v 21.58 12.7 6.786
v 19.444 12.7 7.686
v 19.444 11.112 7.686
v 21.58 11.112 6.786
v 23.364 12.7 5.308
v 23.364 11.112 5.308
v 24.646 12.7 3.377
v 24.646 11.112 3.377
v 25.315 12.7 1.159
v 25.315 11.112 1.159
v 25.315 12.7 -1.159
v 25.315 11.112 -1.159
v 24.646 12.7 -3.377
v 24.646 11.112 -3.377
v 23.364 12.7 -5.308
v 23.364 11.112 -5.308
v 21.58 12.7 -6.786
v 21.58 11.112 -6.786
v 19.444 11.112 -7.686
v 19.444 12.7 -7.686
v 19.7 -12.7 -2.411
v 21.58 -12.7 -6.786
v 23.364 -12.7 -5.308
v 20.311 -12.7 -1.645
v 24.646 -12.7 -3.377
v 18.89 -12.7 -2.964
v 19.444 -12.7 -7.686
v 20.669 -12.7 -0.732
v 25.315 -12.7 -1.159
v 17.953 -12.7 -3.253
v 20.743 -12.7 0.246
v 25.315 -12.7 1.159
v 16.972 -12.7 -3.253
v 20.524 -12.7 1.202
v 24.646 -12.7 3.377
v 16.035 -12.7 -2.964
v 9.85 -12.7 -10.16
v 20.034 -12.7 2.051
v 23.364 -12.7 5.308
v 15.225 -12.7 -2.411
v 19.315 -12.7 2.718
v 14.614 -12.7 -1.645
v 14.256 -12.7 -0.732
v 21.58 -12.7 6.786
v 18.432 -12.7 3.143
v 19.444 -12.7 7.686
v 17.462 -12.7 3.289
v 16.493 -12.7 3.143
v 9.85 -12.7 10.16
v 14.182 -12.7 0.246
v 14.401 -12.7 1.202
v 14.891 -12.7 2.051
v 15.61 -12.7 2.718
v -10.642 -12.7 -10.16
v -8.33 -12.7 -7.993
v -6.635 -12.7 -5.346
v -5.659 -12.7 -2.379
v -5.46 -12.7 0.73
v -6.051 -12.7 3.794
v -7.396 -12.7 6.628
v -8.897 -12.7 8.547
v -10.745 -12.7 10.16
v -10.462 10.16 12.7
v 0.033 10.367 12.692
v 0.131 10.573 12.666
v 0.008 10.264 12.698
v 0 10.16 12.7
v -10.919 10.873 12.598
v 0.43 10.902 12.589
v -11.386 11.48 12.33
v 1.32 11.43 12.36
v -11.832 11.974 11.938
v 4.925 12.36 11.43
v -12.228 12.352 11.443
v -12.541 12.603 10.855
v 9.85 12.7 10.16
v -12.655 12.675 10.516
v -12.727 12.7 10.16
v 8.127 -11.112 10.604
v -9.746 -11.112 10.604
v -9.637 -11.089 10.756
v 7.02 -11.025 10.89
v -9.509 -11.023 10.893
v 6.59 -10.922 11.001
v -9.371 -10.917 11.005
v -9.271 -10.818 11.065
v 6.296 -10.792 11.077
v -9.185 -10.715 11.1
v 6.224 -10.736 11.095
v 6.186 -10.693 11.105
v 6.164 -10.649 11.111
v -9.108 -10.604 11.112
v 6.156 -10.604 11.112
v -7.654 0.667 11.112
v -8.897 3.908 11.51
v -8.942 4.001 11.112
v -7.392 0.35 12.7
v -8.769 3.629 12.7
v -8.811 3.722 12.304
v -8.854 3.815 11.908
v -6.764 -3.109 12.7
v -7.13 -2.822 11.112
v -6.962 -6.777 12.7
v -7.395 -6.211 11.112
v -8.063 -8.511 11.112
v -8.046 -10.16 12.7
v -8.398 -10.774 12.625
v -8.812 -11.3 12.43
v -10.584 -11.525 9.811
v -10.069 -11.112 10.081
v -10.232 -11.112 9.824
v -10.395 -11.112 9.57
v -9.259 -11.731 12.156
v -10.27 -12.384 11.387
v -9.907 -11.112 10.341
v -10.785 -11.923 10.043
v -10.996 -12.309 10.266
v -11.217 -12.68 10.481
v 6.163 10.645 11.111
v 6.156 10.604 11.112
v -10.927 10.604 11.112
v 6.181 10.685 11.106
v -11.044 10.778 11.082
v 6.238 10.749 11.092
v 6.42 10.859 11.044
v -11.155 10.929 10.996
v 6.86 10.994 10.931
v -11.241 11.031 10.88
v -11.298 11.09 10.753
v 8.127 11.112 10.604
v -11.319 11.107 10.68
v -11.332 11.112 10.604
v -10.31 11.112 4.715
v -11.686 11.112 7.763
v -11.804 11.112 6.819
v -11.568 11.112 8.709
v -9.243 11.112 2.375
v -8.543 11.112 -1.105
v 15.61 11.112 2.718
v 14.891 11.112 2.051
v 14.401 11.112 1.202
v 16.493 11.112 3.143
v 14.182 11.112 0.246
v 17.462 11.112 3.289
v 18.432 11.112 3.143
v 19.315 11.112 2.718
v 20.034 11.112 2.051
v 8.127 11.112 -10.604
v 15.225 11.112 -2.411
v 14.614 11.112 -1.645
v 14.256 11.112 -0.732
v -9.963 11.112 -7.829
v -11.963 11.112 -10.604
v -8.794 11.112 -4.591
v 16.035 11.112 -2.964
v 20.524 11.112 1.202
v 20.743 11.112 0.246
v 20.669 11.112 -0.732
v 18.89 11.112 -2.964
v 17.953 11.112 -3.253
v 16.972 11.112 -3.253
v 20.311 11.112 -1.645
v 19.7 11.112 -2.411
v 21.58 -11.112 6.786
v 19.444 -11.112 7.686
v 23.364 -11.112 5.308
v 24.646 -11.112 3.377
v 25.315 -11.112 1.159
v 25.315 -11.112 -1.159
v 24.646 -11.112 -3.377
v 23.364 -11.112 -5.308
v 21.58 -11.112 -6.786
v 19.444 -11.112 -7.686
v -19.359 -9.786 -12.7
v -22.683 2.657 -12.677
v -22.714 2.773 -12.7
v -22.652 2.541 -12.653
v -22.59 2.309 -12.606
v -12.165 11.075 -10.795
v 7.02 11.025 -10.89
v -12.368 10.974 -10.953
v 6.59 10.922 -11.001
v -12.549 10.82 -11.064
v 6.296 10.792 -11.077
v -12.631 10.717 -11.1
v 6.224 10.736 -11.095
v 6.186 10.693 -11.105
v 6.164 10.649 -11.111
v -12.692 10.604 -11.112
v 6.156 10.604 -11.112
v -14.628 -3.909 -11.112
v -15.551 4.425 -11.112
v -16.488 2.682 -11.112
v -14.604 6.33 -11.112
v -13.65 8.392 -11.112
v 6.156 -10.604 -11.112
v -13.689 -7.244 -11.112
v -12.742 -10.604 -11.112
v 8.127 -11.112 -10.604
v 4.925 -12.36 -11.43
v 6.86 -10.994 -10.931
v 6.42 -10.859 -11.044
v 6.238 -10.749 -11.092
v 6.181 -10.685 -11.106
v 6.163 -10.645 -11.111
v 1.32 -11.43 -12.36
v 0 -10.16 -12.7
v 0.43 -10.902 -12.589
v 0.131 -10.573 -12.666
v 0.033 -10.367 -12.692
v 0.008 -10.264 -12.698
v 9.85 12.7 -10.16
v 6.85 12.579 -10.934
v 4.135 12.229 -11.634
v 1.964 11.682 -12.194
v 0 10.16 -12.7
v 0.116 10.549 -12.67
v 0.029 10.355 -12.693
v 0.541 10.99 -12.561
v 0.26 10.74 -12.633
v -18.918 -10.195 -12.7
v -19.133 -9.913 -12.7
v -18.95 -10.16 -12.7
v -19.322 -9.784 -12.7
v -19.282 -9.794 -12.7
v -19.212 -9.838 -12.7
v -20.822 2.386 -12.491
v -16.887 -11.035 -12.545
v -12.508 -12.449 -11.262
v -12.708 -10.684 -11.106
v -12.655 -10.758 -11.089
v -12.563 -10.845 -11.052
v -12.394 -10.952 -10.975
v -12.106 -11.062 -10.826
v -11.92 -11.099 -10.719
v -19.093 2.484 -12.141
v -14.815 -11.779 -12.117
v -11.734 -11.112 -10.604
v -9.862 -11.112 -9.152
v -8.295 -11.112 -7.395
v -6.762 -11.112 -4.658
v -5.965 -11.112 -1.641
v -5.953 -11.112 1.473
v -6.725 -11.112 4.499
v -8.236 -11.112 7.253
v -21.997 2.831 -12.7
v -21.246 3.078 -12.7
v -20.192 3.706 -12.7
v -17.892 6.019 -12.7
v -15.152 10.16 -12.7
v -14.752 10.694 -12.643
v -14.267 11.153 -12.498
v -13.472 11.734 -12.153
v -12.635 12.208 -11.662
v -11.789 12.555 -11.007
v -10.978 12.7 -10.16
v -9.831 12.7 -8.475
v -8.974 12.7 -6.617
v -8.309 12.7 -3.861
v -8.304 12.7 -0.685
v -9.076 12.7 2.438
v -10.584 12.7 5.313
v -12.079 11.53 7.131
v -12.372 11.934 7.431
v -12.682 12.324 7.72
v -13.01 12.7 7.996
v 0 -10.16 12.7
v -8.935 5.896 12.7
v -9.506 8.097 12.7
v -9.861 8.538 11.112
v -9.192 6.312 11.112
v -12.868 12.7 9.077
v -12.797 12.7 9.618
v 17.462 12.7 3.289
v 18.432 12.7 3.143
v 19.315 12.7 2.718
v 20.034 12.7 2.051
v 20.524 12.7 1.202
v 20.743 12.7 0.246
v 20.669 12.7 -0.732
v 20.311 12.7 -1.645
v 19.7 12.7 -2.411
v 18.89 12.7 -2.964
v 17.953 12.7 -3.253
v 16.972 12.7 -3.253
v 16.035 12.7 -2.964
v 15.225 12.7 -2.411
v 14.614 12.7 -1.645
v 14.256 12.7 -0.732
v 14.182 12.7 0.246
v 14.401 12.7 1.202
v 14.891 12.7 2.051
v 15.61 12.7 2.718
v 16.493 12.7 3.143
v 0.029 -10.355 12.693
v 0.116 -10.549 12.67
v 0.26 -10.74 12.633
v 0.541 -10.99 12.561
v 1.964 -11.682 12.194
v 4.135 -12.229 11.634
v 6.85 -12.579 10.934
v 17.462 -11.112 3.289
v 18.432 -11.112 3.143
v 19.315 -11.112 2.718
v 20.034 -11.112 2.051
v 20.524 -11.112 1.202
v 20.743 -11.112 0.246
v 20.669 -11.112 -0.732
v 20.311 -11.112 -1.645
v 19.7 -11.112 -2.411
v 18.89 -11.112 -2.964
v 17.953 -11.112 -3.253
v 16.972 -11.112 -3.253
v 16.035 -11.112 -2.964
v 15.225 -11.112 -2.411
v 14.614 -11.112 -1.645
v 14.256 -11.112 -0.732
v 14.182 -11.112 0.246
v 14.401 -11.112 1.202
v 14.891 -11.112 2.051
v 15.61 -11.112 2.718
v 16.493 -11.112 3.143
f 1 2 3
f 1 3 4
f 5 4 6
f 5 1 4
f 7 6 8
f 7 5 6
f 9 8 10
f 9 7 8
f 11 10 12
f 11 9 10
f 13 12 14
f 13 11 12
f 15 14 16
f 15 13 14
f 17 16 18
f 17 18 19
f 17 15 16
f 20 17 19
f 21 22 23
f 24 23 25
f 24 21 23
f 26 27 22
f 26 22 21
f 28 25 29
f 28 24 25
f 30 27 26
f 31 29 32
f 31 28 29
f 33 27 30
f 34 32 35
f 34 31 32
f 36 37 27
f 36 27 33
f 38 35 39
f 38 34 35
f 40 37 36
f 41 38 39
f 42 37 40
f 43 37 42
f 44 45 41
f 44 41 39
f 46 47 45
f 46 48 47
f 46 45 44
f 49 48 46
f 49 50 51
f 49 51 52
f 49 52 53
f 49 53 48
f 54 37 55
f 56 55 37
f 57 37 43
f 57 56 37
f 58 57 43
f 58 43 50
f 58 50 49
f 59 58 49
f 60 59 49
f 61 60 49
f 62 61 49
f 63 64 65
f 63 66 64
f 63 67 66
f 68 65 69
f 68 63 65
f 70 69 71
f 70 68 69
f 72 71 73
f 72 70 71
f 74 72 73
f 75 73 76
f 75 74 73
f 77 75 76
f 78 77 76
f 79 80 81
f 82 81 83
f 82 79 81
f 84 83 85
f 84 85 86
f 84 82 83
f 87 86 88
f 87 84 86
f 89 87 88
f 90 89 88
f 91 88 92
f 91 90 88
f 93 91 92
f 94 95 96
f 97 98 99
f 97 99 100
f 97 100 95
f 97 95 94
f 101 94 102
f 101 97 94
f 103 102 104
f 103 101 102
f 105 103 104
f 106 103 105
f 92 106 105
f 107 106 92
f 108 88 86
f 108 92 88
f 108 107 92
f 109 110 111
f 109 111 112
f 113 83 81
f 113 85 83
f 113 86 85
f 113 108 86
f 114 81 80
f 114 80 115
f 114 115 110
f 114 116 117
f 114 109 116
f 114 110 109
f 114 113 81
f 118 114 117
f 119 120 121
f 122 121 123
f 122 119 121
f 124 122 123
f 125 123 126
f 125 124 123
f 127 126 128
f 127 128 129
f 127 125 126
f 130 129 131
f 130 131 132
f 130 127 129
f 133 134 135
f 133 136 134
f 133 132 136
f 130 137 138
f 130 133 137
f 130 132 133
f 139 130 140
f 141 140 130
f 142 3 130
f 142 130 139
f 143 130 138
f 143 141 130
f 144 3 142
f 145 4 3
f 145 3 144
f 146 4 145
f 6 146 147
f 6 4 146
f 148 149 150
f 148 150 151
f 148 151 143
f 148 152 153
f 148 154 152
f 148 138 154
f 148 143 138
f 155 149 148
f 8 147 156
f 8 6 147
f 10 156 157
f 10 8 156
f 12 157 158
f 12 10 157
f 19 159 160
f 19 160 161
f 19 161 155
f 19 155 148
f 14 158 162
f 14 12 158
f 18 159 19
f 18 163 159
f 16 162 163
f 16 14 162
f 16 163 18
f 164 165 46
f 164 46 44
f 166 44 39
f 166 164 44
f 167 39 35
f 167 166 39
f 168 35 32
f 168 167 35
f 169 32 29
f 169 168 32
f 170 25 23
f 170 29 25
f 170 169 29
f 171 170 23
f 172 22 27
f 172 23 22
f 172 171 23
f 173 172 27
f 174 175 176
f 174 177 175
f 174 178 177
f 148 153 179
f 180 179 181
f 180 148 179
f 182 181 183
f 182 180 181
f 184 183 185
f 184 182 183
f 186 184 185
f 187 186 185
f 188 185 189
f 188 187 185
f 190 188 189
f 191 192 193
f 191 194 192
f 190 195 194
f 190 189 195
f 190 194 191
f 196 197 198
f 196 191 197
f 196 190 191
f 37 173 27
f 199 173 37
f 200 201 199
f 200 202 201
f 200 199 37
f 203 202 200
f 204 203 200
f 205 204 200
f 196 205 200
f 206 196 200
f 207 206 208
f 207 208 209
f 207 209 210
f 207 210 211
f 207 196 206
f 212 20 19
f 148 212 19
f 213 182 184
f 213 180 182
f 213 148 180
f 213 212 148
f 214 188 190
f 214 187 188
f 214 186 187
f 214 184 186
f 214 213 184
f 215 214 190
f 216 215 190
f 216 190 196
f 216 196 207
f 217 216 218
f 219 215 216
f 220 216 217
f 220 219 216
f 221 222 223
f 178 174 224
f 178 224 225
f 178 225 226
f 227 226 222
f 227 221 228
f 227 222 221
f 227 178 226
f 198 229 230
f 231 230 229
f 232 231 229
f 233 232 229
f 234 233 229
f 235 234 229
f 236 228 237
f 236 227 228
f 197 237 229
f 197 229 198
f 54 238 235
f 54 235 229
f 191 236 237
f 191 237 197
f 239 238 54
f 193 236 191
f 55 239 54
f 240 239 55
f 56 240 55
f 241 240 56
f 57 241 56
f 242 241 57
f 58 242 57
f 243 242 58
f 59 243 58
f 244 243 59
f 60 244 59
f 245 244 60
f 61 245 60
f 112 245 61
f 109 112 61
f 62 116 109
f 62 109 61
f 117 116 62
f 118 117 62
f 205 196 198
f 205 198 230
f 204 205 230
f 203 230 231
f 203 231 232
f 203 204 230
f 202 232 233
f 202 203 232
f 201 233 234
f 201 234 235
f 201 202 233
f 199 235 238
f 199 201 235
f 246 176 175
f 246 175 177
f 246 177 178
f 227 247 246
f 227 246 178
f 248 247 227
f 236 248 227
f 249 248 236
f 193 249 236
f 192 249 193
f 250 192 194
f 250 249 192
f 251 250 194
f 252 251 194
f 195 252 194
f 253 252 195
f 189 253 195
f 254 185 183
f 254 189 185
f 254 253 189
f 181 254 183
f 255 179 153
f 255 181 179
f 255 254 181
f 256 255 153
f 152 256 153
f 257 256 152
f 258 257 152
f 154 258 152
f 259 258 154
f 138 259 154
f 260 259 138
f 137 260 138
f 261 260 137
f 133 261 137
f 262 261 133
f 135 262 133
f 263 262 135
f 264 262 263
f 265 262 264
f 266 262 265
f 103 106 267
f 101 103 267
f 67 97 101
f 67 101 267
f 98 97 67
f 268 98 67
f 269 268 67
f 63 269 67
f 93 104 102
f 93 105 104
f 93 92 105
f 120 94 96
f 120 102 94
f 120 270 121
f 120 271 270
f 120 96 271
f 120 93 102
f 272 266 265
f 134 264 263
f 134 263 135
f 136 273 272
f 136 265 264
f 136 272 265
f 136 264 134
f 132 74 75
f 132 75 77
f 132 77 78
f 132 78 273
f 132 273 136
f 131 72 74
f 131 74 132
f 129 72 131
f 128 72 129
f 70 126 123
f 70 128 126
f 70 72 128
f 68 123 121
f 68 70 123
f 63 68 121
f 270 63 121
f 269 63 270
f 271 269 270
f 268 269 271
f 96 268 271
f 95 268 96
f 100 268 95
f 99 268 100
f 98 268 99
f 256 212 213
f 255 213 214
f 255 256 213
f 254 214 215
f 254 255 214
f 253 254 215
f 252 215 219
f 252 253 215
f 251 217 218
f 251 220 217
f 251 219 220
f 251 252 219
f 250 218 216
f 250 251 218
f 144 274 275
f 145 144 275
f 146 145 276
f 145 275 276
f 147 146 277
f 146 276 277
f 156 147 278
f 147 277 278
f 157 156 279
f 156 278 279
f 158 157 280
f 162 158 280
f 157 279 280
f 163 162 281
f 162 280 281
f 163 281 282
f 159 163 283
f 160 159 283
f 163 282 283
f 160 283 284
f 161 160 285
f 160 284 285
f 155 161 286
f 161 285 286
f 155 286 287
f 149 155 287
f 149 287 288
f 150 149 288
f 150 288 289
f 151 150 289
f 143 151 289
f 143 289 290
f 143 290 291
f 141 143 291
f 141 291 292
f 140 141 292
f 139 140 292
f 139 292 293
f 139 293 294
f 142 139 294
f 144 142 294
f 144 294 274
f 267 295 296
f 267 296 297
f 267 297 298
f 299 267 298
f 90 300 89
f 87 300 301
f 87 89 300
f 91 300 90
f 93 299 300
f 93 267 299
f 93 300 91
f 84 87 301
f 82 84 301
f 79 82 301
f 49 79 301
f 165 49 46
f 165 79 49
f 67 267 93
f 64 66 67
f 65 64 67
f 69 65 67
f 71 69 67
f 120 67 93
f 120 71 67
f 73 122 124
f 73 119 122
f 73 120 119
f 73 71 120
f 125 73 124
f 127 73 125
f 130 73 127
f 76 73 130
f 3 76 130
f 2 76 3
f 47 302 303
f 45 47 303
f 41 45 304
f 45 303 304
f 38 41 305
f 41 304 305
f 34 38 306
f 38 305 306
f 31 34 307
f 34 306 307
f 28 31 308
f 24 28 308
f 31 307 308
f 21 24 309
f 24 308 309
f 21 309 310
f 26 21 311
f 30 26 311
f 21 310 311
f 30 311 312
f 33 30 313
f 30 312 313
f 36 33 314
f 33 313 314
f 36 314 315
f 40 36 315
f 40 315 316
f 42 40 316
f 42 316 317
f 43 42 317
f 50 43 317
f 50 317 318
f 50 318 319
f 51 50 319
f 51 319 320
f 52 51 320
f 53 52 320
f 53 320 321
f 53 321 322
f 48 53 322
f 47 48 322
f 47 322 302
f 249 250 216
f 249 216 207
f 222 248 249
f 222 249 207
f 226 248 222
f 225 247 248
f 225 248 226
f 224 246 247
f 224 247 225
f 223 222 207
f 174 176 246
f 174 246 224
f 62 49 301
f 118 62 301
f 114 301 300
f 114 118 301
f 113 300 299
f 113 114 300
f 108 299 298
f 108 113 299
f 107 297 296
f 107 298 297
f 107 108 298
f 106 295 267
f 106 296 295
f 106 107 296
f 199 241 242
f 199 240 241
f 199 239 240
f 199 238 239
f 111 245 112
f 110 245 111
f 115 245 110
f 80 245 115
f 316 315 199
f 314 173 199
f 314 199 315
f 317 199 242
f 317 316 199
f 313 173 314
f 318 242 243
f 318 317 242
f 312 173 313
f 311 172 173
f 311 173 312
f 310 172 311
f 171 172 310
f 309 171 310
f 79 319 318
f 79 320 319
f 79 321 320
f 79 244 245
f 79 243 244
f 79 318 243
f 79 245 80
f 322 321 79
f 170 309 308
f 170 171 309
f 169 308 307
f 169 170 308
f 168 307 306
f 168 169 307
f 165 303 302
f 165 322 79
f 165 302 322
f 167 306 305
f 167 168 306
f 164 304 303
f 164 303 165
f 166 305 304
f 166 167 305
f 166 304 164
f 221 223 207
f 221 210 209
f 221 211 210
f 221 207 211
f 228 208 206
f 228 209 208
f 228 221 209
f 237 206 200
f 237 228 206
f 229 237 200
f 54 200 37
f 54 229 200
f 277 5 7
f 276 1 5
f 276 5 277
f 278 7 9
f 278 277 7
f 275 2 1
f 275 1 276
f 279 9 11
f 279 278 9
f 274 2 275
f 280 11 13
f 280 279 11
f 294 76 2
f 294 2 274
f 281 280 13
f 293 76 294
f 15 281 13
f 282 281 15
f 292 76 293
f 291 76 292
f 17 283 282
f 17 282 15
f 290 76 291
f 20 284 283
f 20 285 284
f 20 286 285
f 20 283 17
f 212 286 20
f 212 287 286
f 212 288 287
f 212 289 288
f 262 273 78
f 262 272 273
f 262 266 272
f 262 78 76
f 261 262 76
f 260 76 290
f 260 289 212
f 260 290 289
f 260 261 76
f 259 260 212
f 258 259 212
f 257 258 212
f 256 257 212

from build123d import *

# Parameters (mm, degrees)
BOSS_EXTRUDE1_DEPTH      = 25.4
BOSS_EXTRUDE1_DEPTH_BACK = 34.925
CUT_EXTRUDE4_DEPTH       = 63.941922635
CUT_EXTRUDE5_DEPTH       = 46.01339384
SKETCH14_R               = 3.2893
CUT_EXTRUDE6_DEPTH       = 46.01339384
CUT_EXTRUDE7_DEPTH       = 76.2
CUT_EXTRUDE7_DEPTH_BACK  = 12.7
SKETCH15_R               = 12.7
CUT_EXTRUDE8_DEPTH       = 10.668
CUT_EXTRUDE8_DEPTH_BACK  = 25.4
SKETCH16_R               = 12.7
CUT_EXTRUDE9_DEPTH       = 13.462
CUT_EXTRUDE9_DEPTH_BACK  = 25.4
SKETCH17_R               = 12.7
CUT_EXTRUDE10_DEPTH      = 11.43
CUT_EXTRUDE10_DEPTH_BACK = 25.4
SKETCH18_R               = 12.7
CUT_EXTRUDE11_DEPTH      = 10.668
CUT_EXTRUDE11_DEPTH_BACK = 25.4
SKETCH19_R               = 12.7
SKETCH20_W               = 46.918980947
SKETCH20_H               = 36.132247669
CUT_EXTRUDE12_DEPTH      = 51.98499249


with BuildPart() as part:
    # Sketch1 → Boss-Extrude1 (new, two sides: drawn at the far end of the back side and taken through both)
    with BuildSketch(Plane(origin=(0, 0, 0), x_dir=(0, 0, -1), z_dir=(1, 0, 0)).offset(-BOSS_EXTRUDE1_DEPTH_BACK)):
        with BuildLine():
            Line((-10.16, 12.7), (10.16, 12.7))
            ThreePointArc((10.16, 12.7), (11.956051224, 11.956051224), (12.7, 10.16))
            Line((12.7, 10.16), (12.7, -10.16))
            ThreePointArc((12.7, -10.16), (11.956051224, -11.956051224), (10.16, -12.7))
            Line((10.16, -12.7), (-10.16, -12.7))
            ThreePointArc((-10.16, -12.7), (-11.956051224, -11.956051224), (-12.7, -10.16))
            Line((-12.7, -10.16), (-12.7, 10.16))
            ThreePointArc((-12.7, 10.16), (-11.956051224, 11.956051224), (-10.16, 12.7))
        make_face()
    extrude(amount=BOSS_EXTRUDE1_DEPTH + BOSS_EXTRUDE1_DEPTH_BACK)

    # Sketch11 → Cut-Extrude4 (cut, through all)
    with BuildSketch(Plane(origin=(25.4, 0, 0), x_dir=(0, 0, -1), z_dir=(1, 0, 0))):
        with BuildLine():
            Line((-10.6045, 11.1125), (10.6045, 11.1125))
            ThreePointArc((10.6045, 11.1125), (10.963710245, 10.963710245), (11.1125, 10.6045))
            Line((11.1125, 10.6045), (11.1125, -10.6045))
            ThreePointArc((11.1125, -10.6045), (10.963710245, -10.963710245), (10.6045, -11.1125))
            Line((10.6045, -11.1125), (-10.6045, -11.1125))
            ThreePointArc((-10.6045, -11.1125), (-10.963710245, -10.963710245), (-11.1125, -10.6045))
            Line((-11.1125, -10.6045), (-11.1125, 10.6045))
            ThreePointArc((-11.1125, 10.6045), (-10.963710245, 10.963710245), (-10.6045, 11.1125))
        make_face()
    extrude(amount=-CUT_EXTRUDE4_DEPTH, mode=Mode.SUBTRACT)

    # Sketch12 → Cut-Extrude5 (cut, through all)
    with BuildSketch(Plane(origin=(0, 12.7, 0), x_dir=(1, 0, 0), z_dir=(0, 1, 0))):
        with BuildLine():
            Line((50.8, 12.7), (0, 12.7))
            Line((0, 12.7), (19.444424463, 7.686083637))
            ThreePointArc((19.444424463, 7.686083637), (25.4, 0), (19.444424463, -7.686083637))
            Line((19.444424463, -7.686083637), (0, -12.7))
            Line((0, -12.7), (50.8, -12.7))
            Line((50.8, -12.7), (50.8, 12.7))
        make_face()
    extrude(amount=-CUT_EXTRUDE5_DEPTH, mode=Mode.SUBTRACT)

    # Sketch14 → Cut-Extrude6 (cut, through all)
    with BuildSketch(Plane(origin=(0, 12.7, 0), x_dir=(1, 0, 0), z_dir=(0, 1, 0))):
        with Locations((17.4625, 0)):
            Circle(SKETCH14_R)
    extrude(amount=-CUT_EXTRUDE6_DEPTH, mode=Mode.SUBTRACT)

    # Sketch15 → Cut-Extrude7 (cut, two sides: drawn at the far end of the back side and taken through both)
    with BuildSketch(Plane(origin=(-25.365699209, 12.7, 0.175387953), x_dir=(-0.966128643141705, -0.2580531152287385, -0.0020086368292109116), z_dir=(0.258060932535648, -0.9660993767043435, -0.007519935525699624)).offset(-CUT_EXTRUDE7_DEPTH_BACK)):
        Circle(SKETCH15_R)
    extrude(amount=CUT_EXTRUDE7_DEPTH + CUT_EXTRUDE7_DEPTH_BACK, mode=Mode.SUBTRACT)

    # Sketch16 → Cut-Extrude8 (cut, two sides: drawn at the far end of the back side and taken through both)
    with BuildSketch(Plane(origin=(-21.145247559, 12.7, -1.764300444), x_dir=(-0.9824624854144782, 0.18269743061253008, -0.03727081432952601), z_dir=(-0.18646035705534364, -0.9626355681875568, 0.1963804931937318)).offset(-CUT_EXTRUDE8_DEPTH_BACK)):
        Circle(SKETCH16_R)
    extrude(amount=CUT_EXTRUDE8_DEPTH + CUT_EXTRUDE8_DEPTH_BACK, mode=Mode.SUBTRACT)

    # Sketch17 → Cut-Extrude9 (cut, two sides: drawn at the far end of the back side and taken through both)
    with BuildSketch(Plane(origin=(-34.925, 0.334385976, 0.104098467), x_dir=(0, 0, -1), z_dir=(0.9661266940476223, 0.2580682294444866, 0)).offset(-CUT_EXTRUDE9_DEPTH_BACK)):
        Circle(SKETCH17_R)
    extrude(amount=CUT_EXTRUDE9_DEPTH + CUT_EXTRUDE9_DEPTH_BACK, mode=Mode.SUBTRACT)


with BuildPart() as body_2:
    # of the pieces the cut leaves, the one that is kept (cut_extrude9_keep)
    add(part.part.solids().sort_by_distance((-34.925, -12.7, 10.16))[0])

    # Sketch18 → Cut-Extrude10 (cut, two sides: drawn at the far end of the back side and taken through both)
    with BuildSketch(Plane(origin=(-21.542643879, 3.81098788, 12.7), x_dir=(-0.9940833845942291, 0.0023249747136513278, 0.10859474649476883), z_dir=(-0.1086196320822448, -0.021278093914850475, -0.9938556324968274)).offset(-CUT_EXTRUDE10_DEPTH_BACK)):
        Circle(SKETCH18_R)
    extrude(amount=CUT_EXTRUDE10_DEPTH + CUT_EXTRUDE10_DEPTH_BACK, mode=Mode.SUBTRACT)

    # Sketch19 → Cut-Extrude11 (cut, two sides: drawn at the far end of the back side and taken through both)
    with BuildSketch(Plane(origin=(-19.809355594, -2.656223175, 12.7), x_dir=(-0.9763290145154151, -0.09548845507502762, 0.19407114768234568), z_dir=(-0.2162906734359075, 0.43103175814294675, -0.8760308031438403)).offset(-CUT_EXTRUDE11_DEPTH_BACK)):
        Circle(SKETCH19_R)
    extrude(amount=CUT_EXTRUDE11_DEPTH + CUT_EXTRUDE11_DEPTH_BACK, mode=Mode.SUBTRACT)

    # Sketch20 → Cut-Extrude12 (cut, through all)
    with BuildSketch(Plane(origin=(-20.509915766, -5.478533696, 0), x_dir=(0.2580609325356479, -0.9660993767043435, -0.007519935525699628), z_dir=(-0.9661266940476223, -0.25806822944448654, 0))):
        with Locations((-1.610495454, -1.756475899)):
            Rectangle(SKETCH20_W, SKETCH20_H)
    extrude(amount=CUT_EXTRUDE12_DEPTH, mode=Mode.SUBTRACT)


solid = body_2.part
